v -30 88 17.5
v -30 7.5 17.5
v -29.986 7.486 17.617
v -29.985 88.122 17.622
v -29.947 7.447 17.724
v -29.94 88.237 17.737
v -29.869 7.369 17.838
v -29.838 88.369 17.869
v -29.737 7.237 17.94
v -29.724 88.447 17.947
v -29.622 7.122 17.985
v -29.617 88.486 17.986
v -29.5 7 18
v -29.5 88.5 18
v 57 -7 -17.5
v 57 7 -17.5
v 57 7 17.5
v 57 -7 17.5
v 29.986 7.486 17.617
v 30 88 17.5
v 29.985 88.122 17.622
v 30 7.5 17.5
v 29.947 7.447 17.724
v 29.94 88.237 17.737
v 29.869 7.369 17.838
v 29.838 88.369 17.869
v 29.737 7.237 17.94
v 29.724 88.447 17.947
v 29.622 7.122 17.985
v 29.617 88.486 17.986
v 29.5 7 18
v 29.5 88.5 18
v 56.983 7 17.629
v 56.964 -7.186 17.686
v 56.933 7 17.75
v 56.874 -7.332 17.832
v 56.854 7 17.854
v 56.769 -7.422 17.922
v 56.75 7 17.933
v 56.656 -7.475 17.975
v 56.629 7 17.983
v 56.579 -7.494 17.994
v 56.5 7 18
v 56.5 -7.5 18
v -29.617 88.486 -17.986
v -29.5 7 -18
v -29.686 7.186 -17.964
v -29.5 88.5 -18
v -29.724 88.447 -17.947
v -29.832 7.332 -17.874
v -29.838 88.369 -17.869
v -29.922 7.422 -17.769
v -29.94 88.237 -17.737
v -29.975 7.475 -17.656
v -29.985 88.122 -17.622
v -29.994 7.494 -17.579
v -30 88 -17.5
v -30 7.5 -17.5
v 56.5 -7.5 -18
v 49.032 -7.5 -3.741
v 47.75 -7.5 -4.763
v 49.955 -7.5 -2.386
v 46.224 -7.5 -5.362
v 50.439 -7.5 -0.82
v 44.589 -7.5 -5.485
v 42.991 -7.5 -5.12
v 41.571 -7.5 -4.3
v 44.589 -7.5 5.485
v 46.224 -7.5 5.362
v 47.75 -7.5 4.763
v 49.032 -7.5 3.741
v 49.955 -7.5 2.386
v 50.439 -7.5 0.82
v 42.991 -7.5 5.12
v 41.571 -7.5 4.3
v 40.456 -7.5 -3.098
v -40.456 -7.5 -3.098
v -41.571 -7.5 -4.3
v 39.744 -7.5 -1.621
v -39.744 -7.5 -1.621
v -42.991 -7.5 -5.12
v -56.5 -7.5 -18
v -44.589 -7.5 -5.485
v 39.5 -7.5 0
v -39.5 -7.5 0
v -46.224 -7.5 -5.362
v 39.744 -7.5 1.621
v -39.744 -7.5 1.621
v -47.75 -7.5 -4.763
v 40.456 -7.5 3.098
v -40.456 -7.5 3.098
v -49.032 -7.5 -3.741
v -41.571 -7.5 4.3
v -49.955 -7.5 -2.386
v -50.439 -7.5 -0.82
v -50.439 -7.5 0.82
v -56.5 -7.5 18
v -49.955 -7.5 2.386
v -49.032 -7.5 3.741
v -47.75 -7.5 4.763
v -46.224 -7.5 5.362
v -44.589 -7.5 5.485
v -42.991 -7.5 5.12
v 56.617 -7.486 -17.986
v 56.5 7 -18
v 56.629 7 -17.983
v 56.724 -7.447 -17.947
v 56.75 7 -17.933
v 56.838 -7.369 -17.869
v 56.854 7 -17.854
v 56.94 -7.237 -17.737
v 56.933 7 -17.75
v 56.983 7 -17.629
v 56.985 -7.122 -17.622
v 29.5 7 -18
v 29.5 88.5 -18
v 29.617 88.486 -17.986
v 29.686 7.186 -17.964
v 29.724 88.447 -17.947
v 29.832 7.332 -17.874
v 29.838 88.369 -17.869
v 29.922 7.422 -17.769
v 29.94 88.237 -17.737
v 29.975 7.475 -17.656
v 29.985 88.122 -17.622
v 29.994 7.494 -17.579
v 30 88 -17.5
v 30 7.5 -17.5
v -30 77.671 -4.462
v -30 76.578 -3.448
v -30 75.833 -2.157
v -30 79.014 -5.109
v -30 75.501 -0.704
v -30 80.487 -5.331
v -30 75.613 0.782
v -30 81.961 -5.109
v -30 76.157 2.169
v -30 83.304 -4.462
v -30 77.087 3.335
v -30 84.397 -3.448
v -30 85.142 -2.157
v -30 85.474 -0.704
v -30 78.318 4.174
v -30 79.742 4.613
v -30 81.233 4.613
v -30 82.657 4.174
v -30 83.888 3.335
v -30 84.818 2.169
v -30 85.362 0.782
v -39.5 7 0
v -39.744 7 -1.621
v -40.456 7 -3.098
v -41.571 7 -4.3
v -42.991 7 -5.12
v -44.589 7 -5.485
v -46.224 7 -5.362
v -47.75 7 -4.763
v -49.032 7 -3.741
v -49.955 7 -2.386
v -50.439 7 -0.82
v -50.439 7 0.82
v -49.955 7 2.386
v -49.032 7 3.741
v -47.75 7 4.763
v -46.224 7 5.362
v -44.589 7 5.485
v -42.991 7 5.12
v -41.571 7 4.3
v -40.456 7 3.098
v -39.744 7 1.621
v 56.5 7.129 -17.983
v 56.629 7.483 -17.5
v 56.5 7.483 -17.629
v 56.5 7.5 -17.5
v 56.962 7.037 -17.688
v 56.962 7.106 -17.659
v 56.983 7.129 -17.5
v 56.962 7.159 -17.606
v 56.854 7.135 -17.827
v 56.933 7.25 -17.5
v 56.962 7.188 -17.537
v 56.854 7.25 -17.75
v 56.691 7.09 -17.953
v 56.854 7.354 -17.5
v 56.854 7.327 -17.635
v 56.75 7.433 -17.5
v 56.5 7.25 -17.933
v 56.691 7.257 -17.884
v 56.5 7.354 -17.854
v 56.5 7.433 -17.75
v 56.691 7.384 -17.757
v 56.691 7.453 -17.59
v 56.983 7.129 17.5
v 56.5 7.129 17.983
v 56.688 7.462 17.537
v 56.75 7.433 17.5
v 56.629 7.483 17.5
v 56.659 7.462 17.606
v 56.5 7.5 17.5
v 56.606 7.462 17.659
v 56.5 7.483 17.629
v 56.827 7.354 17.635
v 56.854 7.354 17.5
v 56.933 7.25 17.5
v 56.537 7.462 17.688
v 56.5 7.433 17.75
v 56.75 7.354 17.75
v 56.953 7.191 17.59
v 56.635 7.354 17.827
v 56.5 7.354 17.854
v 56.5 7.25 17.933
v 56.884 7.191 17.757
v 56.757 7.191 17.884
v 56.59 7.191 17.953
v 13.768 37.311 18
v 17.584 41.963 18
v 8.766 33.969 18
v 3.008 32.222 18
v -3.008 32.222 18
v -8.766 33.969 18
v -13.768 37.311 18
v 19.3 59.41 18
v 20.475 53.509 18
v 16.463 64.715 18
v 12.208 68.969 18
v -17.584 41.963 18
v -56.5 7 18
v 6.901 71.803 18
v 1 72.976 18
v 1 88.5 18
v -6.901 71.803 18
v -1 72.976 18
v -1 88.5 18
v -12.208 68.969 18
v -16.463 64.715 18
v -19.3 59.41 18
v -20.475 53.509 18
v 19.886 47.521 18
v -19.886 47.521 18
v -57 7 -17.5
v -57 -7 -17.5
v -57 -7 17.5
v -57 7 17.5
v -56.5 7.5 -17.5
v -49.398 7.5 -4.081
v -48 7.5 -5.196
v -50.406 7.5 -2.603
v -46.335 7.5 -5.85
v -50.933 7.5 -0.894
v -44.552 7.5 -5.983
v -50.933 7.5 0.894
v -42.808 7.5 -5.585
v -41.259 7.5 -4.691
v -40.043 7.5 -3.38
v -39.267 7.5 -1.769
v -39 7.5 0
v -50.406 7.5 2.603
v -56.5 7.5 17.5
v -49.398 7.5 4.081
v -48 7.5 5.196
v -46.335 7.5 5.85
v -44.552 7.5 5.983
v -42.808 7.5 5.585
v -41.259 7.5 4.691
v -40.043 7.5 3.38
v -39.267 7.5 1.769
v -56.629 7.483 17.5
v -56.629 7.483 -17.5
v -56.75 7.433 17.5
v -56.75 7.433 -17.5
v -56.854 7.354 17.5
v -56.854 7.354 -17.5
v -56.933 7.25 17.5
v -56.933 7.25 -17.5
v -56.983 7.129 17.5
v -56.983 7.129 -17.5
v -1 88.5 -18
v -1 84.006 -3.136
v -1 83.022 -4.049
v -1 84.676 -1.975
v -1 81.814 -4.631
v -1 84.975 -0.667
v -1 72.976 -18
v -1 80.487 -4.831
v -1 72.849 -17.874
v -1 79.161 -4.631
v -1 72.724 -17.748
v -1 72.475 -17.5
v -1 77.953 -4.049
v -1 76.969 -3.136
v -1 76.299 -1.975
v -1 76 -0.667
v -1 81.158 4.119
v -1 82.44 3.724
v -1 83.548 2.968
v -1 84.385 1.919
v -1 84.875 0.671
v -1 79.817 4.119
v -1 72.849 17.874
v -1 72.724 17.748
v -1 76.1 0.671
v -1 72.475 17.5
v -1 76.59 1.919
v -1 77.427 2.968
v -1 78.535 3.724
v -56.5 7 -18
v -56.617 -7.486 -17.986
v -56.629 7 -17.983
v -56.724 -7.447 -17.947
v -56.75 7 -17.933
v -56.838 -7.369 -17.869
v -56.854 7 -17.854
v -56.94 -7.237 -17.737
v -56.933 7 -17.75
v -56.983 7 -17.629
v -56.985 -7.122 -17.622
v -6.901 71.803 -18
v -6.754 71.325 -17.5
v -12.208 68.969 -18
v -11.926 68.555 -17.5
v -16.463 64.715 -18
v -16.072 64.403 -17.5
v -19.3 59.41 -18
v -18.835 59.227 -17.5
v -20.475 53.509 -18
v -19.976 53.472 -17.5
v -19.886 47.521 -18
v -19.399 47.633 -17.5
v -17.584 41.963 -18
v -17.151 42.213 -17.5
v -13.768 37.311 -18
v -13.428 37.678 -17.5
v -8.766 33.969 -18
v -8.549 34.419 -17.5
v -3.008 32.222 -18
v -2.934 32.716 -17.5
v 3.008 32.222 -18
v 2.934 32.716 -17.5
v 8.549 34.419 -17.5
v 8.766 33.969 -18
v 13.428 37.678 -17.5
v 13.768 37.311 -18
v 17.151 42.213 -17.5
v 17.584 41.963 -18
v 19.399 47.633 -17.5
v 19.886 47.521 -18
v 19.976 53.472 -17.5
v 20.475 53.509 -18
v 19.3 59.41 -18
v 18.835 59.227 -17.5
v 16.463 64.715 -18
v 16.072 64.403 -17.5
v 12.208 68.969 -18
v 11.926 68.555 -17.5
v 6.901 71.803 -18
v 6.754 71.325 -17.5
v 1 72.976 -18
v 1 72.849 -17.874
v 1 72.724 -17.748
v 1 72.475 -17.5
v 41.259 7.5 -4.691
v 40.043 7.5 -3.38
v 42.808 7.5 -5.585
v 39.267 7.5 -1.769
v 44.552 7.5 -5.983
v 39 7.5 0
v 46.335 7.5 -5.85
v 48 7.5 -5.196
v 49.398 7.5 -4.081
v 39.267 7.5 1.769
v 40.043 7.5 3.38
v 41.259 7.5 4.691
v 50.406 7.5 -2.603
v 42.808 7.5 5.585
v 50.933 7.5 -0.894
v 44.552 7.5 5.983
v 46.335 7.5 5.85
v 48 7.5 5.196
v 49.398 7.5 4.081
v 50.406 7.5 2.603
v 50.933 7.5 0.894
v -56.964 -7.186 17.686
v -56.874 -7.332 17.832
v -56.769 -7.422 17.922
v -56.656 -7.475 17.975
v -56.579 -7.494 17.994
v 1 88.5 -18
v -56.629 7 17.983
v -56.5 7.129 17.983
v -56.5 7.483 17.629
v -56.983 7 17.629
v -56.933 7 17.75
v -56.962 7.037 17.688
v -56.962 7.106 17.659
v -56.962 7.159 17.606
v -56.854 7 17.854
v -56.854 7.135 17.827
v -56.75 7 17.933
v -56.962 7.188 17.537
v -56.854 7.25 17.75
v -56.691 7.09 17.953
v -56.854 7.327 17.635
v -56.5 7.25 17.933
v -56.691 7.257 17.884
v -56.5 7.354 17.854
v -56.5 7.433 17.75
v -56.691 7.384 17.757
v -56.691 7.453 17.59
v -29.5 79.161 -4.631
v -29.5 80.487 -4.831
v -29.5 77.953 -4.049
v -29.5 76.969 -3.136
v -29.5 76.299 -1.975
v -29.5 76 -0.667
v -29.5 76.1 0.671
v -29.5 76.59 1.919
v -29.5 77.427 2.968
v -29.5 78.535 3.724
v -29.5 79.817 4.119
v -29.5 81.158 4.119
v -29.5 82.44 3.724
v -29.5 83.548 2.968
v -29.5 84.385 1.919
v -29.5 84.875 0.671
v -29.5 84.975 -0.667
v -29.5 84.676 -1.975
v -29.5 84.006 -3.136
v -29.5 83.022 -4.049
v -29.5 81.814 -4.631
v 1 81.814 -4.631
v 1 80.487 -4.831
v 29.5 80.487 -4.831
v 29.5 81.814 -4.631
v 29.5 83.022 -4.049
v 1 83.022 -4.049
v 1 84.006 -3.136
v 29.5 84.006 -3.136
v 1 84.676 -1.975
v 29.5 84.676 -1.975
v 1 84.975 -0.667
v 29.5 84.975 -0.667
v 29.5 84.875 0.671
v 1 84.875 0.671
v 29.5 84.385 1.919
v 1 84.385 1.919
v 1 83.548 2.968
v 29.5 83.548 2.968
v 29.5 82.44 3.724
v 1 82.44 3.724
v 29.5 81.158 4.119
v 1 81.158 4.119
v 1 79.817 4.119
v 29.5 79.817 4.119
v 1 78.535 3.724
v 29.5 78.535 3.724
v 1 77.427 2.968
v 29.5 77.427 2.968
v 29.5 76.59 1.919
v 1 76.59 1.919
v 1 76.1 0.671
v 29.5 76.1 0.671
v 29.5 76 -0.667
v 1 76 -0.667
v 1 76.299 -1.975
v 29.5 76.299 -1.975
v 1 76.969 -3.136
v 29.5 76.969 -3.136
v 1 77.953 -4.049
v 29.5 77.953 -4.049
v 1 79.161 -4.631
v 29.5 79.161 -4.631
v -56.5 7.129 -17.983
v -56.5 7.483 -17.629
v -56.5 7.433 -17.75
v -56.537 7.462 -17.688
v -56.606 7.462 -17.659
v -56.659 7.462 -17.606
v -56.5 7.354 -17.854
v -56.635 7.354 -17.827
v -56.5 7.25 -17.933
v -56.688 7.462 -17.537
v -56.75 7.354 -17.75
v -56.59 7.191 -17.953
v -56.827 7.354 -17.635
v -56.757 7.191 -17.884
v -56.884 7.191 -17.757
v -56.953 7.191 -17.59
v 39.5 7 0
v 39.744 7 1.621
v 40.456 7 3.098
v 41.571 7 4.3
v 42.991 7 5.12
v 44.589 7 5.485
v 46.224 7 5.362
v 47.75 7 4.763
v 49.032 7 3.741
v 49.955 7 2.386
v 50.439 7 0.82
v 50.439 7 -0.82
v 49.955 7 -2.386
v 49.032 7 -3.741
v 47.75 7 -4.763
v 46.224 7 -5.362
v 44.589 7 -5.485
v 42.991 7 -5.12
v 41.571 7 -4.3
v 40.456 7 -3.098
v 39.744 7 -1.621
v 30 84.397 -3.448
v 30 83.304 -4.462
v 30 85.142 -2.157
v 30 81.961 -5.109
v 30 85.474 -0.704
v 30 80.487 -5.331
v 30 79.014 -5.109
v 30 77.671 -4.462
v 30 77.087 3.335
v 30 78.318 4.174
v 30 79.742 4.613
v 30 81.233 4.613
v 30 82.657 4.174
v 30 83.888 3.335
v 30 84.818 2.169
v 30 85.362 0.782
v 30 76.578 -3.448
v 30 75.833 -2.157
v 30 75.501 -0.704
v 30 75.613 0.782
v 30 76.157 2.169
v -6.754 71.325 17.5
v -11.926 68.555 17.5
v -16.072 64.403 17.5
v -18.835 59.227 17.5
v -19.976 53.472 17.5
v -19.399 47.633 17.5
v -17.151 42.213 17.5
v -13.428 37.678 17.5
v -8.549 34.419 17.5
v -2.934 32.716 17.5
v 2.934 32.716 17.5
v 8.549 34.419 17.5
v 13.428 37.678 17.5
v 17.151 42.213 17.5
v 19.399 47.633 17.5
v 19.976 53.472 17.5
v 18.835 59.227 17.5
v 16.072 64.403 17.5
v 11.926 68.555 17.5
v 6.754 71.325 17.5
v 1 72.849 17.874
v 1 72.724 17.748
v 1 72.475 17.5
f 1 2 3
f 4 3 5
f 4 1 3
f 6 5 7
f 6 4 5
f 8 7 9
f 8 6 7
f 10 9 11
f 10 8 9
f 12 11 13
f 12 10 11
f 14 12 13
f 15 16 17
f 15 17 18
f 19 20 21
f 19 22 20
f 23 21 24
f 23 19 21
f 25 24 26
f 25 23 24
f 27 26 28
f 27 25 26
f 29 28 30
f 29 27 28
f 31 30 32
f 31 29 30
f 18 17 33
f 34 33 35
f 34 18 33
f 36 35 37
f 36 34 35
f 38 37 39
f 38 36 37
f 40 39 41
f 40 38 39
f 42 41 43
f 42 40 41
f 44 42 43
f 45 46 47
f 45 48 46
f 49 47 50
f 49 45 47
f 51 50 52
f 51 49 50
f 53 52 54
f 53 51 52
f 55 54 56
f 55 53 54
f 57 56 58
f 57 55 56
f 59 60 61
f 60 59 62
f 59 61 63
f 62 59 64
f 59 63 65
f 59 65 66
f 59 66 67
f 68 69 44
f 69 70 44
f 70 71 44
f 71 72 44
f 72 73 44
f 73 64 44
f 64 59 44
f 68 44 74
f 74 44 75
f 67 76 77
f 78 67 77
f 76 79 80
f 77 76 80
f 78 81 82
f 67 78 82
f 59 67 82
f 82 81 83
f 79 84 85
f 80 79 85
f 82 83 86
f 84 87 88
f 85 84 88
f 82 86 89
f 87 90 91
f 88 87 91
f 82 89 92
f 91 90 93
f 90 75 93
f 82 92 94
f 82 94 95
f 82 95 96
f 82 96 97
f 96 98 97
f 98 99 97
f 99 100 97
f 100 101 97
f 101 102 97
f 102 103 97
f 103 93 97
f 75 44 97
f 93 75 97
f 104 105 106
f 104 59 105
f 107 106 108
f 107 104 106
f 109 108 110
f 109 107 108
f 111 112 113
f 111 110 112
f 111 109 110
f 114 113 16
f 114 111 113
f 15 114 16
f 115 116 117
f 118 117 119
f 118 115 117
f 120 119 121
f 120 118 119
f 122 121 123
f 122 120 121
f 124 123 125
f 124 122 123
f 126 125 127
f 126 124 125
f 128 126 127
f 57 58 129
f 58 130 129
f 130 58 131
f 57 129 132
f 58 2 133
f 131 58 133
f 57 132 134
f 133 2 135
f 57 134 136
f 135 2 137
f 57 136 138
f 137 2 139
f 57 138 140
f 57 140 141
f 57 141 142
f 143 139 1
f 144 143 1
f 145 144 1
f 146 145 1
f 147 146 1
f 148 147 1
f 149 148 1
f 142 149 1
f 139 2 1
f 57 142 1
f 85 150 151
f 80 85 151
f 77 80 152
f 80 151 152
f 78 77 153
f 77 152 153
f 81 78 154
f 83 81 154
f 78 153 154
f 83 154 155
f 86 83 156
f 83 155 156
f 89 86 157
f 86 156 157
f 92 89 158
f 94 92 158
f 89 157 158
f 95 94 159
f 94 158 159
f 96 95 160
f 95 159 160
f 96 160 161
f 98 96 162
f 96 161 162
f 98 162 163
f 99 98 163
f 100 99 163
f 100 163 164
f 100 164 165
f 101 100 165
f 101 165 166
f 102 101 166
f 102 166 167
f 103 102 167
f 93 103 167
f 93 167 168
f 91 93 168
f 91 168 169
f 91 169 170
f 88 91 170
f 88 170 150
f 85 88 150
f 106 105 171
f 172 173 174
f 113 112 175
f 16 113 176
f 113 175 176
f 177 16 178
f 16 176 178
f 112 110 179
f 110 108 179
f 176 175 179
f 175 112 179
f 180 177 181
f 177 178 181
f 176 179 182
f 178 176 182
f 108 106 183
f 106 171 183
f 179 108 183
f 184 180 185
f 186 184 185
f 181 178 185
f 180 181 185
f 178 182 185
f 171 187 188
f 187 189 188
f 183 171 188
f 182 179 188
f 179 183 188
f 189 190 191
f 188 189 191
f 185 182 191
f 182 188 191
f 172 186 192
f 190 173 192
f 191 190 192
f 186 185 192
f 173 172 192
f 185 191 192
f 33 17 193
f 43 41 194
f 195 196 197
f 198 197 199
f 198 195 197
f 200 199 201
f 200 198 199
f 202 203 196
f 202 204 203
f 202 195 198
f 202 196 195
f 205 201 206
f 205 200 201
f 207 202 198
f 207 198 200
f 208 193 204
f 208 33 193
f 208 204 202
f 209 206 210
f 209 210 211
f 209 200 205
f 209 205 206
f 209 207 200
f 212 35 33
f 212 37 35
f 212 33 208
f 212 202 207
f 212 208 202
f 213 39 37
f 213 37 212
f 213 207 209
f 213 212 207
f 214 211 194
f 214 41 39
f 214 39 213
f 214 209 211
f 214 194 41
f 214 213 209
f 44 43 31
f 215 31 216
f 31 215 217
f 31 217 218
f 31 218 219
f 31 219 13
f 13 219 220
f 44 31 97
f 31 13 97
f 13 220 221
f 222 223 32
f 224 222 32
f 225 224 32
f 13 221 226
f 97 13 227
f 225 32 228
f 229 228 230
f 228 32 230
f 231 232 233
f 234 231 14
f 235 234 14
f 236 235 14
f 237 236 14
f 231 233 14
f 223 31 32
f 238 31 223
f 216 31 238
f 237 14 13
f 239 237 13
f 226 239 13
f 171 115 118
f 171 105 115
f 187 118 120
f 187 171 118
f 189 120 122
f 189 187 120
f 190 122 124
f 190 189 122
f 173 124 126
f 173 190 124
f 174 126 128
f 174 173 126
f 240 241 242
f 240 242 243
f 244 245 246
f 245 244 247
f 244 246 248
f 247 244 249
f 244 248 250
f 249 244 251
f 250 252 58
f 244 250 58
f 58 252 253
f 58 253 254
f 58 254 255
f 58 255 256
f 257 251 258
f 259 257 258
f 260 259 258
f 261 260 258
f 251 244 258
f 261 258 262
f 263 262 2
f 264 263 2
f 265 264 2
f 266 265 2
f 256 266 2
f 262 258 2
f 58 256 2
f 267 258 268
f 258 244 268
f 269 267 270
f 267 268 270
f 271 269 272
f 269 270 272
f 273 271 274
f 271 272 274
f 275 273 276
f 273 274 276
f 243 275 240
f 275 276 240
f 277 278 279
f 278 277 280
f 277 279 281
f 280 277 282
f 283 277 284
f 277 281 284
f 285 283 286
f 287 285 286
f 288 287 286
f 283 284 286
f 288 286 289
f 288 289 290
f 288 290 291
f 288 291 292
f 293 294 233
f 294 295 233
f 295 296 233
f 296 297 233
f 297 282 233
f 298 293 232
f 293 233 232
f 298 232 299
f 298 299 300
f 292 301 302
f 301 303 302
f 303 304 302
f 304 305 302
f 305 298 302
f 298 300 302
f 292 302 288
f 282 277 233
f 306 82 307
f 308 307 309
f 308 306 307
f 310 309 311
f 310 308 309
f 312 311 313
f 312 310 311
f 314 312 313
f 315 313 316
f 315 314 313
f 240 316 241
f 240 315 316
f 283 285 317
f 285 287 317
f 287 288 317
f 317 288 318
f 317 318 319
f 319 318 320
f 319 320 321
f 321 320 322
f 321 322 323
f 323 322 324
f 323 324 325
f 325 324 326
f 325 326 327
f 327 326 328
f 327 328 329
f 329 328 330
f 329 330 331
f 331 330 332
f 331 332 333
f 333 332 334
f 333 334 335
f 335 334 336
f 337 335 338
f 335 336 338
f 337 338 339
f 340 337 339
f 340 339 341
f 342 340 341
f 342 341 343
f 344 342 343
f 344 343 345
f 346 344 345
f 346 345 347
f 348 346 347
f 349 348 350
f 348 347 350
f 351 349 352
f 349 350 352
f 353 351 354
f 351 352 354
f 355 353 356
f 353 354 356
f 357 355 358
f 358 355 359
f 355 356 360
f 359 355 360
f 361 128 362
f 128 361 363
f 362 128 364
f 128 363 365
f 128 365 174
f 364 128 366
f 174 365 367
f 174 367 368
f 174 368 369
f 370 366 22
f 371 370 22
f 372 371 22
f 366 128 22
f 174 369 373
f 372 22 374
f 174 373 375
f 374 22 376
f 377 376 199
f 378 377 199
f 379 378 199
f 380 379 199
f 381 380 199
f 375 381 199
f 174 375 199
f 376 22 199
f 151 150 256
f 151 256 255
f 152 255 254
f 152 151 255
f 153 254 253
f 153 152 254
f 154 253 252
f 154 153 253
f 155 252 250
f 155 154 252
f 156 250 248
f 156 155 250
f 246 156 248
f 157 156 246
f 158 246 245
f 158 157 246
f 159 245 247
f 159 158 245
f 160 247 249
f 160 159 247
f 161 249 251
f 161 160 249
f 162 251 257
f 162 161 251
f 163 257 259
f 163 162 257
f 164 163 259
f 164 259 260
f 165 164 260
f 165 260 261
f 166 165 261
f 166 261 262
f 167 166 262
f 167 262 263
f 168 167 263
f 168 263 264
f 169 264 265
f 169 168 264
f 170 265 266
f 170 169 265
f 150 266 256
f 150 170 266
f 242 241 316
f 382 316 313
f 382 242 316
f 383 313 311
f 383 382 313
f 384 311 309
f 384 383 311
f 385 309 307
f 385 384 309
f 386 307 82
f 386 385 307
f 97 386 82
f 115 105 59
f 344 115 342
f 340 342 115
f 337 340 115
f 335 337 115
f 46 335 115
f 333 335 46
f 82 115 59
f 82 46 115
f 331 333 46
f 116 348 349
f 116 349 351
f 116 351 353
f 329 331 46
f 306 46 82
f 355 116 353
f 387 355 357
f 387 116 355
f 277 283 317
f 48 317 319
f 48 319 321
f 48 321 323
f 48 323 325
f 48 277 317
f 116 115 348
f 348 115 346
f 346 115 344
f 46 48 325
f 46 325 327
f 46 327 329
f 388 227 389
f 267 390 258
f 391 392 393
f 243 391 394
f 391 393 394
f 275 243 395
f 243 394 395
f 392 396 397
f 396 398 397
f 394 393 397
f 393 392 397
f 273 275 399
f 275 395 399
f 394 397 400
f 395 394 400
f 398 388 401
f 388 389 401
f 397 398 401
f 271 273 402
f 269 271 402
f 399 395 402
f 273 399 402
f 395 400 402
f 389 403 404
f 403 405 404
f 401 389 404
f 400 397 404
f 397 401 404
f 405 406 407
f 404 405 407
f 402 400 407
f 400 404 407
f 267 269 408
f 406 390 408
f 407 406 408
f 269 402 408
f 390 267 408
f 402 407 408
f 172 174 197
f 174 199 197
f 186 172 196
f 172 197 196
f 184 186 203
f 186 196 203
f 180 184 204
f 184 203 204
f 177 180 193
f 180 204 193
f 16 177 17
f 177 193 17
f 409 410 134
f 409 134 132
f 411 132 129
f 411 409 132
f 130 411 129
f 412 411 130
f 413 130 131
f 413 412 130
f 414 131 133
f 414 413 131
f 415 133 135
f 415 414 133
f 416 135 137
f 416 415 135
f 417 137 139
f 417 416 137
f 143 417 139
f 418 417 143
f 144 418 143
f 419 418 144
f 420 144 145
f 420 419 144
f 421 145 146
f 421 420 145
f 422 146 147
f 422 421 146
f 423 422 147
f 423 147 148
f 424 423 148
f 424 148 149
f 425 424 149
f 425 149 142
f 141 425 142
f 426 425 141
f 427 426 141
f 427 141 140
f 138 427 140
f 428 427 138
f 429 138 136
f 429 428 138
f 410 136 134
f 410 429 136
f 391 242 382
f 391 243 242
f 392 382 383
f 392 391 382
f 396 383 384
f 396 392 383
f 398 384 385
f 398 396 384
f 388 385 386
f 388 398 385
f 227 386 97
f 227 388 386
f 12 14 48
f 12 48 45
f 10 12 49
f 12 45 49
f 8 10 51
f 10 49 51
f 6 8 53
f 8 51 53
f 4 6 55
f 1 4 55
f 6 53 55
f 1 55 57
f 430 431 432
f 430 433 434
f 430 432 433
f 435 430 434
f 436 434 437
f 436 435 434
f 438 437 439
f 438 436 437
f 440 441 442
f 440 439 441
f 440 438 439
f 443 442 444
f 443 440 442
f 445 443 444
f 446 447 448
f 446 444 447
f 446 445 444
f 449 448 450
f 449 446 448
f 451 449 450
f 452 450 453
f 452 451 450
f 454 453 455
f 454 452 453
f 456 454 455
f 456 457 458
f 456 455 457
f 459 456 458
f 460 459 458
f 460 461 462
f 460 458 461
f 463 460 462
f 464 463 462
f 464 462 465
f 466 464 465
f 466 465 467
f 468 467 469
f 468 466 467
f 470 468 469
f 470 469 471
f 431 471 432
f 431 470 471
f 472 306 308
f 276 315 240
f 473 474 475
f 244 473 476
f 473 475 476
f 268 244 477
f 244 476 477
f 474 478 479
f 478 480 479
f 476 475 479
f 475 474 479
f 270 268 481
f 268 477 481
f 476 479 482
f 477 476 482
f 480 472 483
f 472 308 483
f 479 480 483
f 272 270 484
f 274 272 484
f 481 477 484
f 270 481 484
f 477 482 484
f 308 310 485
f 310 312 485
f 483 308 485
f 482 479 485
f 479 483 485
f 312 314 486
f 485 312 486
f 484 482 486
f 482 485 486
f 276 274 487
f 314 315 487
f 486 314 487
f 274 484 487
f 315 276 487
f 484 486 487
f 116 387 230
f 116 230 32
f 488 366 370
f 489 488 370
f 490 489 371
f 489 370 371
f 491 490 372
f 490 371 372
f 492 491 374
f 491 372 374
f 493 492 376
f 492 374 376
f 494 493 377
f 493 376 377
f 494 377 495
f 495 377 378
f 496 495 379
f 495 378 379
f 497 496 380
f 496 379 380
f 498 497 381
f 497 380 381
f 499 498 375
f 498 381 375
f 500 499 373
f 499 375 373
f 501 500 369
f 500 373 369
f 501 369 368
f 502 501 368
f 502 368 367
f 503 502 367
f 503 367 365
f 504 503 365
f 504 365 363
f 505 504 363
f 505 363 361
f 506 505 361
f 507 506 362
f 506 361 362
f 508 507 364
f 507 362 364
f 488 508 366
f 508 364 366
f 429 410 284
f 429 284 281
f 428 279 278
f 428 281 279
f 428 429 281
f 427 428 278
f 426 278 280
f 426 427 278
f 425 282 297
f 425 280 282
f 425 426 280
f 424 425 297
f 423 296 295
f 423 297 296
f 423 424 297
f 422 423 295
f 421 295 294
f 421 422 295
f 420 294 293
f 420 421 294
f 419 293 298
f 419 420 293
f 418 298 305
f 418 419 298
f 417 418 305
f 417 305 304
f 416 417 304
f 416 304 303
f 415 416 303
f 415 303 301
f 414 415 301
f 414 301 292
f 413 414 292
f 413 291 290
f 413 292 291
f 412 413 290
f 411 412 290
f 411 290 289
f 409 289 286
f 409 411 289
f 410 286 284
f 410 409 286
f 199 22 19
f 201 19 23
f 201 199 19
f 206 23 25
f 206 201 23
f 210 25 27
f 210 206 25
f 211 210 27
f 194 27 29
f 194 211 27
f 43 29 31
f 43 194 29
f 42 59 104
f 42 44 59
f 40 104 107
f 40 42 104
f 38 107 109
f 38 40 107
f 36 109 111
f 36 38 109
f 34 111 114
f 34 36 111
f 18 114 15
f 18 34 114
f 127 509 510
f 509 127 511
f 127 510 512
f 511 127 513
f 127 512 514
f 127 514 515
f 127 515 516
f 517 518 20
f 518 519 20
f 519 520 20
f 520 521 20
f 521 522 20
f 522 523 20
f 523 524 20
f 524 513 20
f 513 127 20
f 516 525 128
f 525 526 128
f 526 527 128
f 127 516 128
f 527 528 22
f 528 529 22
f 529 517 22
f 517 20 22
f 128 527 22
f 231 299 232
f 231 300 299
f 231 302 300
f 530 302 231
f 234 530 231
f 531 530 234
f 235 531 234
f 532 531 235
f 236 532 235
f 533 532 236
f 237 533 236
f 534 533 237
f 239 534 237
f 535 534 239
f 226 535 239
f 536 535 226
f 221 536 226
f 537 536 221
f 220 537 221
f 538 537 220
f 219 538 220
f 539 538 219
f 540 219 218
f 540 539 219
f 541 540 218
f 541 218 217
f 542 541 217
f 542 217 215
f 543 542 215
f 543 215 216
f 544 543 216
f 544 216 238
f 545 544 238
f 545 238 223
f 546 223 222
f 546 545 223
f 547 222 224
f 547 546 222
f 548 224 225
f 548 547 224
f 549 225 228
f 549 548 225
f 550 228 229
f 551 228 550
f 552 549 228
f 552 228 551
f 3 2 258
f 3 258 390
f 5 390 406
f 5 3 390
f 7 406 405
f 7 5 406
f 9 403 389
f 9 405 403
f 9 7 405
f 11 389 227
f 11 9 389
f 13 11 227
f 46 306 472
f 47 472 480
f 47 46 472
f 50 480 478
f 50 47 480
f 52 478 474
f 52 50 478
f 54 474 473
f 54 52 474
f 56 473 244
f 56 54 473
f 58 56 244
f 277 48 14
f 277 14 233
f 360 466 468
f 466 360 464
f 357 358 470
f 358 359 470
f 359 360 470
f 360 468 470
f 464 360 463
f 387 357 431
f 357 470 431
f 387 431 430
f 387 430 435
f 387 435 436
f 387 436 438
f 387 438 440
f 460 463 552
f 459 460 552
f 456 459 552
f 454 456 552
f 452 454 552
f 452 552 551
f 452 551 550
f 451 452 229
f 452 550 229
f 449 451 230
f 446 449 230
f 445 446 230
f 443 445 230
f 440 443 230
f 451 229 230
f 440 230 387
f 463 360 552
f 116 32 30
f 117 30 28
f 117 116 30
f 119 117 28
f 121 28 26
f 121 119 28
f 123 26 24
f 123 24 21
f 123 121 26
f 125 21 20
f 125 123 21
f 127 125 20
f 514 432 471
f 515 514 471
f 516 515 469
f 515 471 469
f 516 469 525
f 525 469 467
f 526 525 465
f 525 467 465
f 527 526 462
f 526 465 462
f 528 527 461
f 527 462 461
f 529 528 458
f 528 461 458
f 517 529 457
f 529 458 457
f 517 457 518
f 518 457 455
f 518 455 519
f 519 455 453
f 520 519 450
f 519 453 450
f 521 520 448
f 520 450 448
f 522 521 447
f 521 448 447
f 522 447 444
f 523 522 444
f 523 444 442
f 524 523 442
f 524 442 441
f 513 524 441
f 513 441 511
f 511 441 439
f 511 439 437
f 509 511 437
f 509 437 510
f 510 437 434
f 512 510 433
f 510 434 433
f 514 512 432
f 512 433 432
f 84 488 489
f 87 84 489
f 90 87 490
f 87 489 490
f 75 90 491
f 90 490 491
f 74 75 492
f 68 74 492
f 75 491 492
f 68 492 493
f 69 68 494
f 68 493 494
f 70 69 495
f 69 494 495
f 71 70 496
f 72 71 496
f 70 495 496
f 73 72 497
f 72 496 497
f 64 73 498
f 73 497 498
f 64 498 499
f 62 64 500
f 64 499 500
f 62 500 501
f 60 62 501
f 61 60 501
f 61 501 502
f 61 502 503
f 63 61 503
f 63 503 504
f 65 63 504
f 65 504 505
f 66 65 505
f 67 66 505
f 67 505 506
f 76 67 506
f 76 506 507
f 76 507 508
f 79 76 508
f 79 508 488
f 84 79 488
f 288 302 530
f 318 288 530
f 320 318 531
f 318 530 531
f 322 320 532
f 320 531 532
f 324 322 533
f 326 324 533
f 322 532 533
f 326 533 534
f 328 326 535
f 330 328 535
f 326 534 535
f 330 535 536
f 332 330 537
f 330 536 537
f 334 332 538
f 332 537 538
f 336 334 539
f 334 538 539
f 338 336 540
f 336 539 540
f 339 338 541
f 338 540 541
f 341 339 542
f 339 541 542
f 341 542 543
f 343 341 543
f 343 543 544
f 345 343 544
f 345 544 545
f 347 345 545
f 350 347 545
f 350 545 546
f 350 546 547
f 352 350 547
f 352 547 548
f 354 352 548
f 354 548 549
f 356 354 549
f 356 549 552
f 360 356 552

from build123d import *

# Parameters (mm, degrees)
BOSS_EXTRUDE1_DEPTH     = 18
SKETCH2_R               = 5.5
CUT_EXTRUDE1_DEPTH      = 101.667770413
CUT_EXTRUDE2_DEPTH      = 108.332427532
CUT_EXTRUDE2_DEPTH_BACK = 108.332427532
SKETCH5_R               = 4.5
CHAMFER2_SIZE           = 0.5
FILLET2_R               = 0.5


with BuildPart() as part:
    # Sketch1 → Boss-Extrude1 (new, symmetric)
    with BuildSketch(Plane.XY):
        with BuildLine():
            Line((-57, -7.5), (-57, 7.5))
            Line((-57, 7.5), (-30, 7.5))
            Line((-30, 7.5), (-30, 88.5))
            Line((-30, 88.5), (-1, 88.5))
            Line((-1, 88.5), (-1, 72.474984355))
            ThreePointArc((-1, 72.474984355), (0, 32.5), (1, 72.474984355))
            Line((1, 72.474984355), (1, 88.5))
            Line((1, 88.5), (30, 88.5))
            Line((30, 88.5), (30, 7.5))
            Line((30, 7.5), (57, 7.5))
            Line((57, 7.5), (57, -7.5))
            Line((57, -7.5), (-57, -7.5))
        make_face()
    extrude(amount=BOSS_EXTRUDE1_DEPTH, both=True)

    # Sketch2 → Cut-Extrude1 (cut, through all)
    with BuildSketch(Plane(origin=(0, 7.5, 0), x_dir=(1, 0, 0), z_dir=(0, 1, 0))):
        with Locations(Location((45, 0, 0), (0, 0, 180))):
            Circle(SKETCH2_R)
        with Locations((-45, 0)):
            Circle(SKETCH2_R)
    extrude(amount=-CUT_EXTRUDE1_DEPTH, mode=Mode.SUBTRACT)

    # Sketch5 → Cut-Extrude2 (cut, two sides: drawn at the far end of the back side and taken through both)
    with BuildSketch(Plane(origin=(-1, 0, 0), x_dir=(0, 0, -1), z_dir=(1, 0, 0)).offset(-CUT_EXTRUDE2_DEPTH_BACK)):
        with Locations((0.330734984, 80.487492178)):
            Circle(SKETCH5_R)
    extrude(amount=CUT_EXTRUDE2_DEPTH + CUT_EXTRUDE2_DEPTH_BACK, mode=Mode.SUBTRACT)

    # Chamfer2
    chamfer2_edges = [part.edges().sort_by_distance(p)[0] for p in [
        (0, 32.5, -18),
        (0, 32.5, 18),
        (50.5, 7.5, 0),
        (-50.5, 7.5, 0),
        (-30, 80.487492178, 4.169265016),
        (30, 80.487492178, 4.169265016),
    ]]
    chamfer(chamfer2_edges, length=CHAMFER2_SIZE)

    # Fillet2
    fillet2_edges = [part.edges().sort_by_distance(p)[0] for p in [
        (-43.5, 7.5, 18),
        (30, 48, -18),
        (43.5, 7.5, -18),
        (-57, 0, 18),
        (57, 0, -18),
        (-57, 0, -18),
        (-43.5, 7.5, -18),
        (-30, 48, -18),
        (57, 0, 18),
        (30, 88.5, 0),
        (57, 7.5, 0),
        (57, -7.5, 0),
        (-57, -7.5, 0),
        (-57, 7.5, 0),
        (-30, 88.5, 0),
        (43.5, 7.5, 18),
        (30, 48, 18),
        (-30, 48, 18),
    ]]
    fillet(fillet2_edges, radius=FILLET2_R)


solid = part.part
